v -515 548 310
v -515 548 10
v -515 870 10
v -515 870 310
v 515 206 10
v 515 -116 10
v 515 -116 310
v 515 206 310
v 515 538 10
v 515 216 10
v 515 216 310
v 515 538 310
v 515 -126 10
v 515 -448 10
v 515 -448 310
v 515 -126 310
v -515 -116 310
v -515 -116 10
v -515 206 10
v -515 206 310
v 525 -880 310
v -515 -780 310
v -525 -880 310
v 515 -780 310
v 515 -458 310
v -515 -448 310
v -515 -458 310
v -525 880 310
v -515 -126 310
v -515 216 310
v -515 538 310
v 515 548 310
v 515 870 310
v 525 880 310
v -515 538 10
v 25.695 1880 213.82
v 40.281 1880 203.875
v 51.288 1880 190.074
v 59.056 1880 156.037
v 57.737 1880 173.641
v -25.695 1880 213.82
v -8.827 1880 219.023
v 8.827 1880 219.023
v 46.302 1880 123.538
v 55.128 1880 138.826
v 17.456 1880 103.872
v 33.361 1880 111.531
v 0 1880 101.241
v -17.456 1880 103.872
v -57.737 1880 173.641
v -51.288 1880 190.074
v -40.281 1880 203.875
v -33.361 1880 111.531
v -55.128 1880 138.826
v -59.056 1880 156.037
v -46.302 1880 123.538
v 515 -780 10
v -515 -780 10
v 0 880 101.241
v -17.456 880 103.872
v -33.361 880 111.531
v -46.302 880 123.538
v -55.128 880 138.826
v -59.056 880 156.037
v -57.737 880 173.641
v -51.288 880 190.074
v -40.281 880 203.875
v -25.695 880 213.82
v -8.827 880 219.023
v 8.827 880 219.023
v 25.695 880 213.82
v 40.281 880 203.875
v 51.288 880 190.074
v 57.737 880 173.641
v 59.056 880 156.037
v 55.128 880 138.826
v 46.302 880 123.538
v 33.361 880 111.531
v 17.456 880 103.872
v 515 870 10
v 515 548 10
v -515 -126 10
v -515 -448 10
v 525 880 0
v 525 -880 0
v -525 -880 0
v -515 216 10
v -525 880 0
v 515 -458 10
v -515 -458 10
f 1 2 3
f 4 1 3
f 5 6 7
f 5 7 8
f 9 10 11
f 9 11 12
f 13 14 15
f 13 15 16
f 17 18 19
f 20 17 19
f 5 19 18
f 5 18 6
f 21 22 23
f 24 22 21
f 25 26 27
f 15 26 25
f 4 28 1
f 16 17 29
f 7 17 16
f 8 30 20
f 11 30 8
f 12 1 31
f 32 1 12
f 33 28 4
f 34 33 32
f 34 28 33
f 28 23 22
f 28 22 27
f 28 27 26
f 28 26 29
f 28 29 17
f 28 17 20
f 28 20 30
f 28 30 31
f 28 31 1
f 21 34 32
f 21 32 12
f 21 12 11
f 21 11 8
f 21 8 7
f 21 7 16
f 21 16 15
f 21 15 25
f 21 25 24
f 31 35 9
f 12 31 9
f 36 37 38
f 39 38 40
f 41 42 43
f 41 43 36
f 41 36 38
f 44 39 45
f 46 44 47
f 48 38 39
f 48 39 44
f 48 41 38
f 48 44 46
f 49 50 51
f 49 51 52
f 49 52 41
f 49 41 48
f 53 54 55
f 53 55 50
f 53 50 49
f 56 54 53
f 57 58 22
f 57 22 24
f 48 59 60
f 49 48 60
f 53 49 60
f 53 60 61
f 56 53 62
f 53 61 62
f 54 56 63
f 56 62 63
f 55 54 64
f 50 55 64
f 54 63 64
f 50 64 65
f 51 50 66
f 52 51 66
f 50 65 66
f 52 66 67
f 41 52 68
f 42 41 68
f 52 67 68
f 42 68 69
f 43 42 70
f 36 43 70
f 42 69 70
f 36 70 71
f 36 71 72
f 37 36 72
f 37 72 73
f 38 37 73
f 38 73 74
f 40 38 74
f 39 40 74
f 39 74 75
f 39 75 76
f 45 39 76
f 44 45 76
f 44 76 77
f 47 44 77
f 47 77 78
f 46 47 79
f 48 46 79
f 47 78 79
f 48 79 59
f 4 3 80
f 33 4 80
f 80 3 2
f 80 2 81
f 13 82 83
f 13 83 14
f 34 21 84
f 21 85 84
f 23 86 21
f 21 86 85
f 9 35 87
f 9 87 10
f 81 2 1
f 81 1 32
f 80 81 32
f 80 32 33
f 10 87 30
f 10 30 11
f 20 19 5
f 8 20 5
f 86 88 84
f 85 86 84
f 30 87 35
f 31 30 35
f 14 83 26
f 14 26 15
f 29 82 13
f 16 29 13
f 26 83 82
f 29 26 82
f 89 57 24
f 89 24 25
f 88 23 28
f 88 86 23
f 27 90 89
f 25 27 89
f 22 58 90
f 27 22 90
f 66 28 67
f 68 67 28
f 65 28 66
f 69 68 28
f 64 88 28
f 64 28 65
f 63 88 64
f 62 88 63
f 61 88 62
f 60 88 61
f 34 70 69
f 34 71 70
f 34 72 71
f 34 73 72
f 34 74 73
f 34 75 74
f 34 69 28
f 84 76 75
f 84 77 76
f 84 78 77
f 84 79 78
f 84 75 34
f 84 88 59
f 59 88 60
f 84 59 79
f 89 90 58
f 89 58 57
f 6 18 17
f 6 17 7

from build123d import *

# Parameters (mm, degrees)
CROQUIS1_W              = 1050
CROQUIS1_H              = 1760
SALIENTE_EXTRUIR1_DEPTH = 10
CROQUIS2_W              = 1050
CROQUIS2_H              = 1760
CROQUIS2_W_2            = 1030
CROQUIS2_H_2            = 322
SALIENTE_EXTRUIR2_DEPTH = 300
CROQUIS3_R              = 59.221994718
SALIENTE_EXTRUIR3_DEPTH = 1000


with BuildPart() as part:
    # Croquis1 → Saliente-Extruir1 (new body)
    with BuildSketch(Plane.XY):
        Rectangle(CROQUIS1_W, CROQUIS1_H)
    extrude(amount=SALIENTE_EXTRUIR1_DEPTH)

    # Croquis2 → Saliente-Extruir2 (add)
    with BuildSketch(Plane.XY.offset(10)):
        Rectangle(CROQUIS2_W, CROQUIS2_H)
        with Locations((0, 377)):
            Rectangle(CROQUIS2_W_2, CROQUIS2_H_2, mode=Mode.SUBTRACT)
        with Locations((0, 709)):
            Rectangle(CROQUIS2_W_2, CROQUIS2_H_2, mode=Mode.SUBTRACT)
        with Locations((0, 45)):
            Rectangle(CROQUIS2_W_2, CROQUIS2_H_2, mode=Mode.SUBTRACT)
        with Locations((0, -287)):
            Rectangle(CROQUIS2_W_2, CROQUIS2_H_2, mode=Mode.SUBTRACT)
        with Locations((0, -619)):
            Rectangle(CROQUIS2_W_2, CROQUIS2_H_2, mode=Mode.SUBTRACT)
    extrude(amount=SALIENTE_EXTRUIR2_DEPTH)

    # Croquis3 → Saliente-Extruir3 (add)
    with BuildSketch(Plane(origin=(0, 880, 0), x_dir=(1, 0, 0), z_dir=(0, 1, 0))):
        with Locations(Location((0, -160.46266829, 0), (0, 0, 90))):
            Circle(CROQUIS3_R)
    extrude(amount=SALIENTE_EXTRUIR3_DEPTH)


solid = part.part
